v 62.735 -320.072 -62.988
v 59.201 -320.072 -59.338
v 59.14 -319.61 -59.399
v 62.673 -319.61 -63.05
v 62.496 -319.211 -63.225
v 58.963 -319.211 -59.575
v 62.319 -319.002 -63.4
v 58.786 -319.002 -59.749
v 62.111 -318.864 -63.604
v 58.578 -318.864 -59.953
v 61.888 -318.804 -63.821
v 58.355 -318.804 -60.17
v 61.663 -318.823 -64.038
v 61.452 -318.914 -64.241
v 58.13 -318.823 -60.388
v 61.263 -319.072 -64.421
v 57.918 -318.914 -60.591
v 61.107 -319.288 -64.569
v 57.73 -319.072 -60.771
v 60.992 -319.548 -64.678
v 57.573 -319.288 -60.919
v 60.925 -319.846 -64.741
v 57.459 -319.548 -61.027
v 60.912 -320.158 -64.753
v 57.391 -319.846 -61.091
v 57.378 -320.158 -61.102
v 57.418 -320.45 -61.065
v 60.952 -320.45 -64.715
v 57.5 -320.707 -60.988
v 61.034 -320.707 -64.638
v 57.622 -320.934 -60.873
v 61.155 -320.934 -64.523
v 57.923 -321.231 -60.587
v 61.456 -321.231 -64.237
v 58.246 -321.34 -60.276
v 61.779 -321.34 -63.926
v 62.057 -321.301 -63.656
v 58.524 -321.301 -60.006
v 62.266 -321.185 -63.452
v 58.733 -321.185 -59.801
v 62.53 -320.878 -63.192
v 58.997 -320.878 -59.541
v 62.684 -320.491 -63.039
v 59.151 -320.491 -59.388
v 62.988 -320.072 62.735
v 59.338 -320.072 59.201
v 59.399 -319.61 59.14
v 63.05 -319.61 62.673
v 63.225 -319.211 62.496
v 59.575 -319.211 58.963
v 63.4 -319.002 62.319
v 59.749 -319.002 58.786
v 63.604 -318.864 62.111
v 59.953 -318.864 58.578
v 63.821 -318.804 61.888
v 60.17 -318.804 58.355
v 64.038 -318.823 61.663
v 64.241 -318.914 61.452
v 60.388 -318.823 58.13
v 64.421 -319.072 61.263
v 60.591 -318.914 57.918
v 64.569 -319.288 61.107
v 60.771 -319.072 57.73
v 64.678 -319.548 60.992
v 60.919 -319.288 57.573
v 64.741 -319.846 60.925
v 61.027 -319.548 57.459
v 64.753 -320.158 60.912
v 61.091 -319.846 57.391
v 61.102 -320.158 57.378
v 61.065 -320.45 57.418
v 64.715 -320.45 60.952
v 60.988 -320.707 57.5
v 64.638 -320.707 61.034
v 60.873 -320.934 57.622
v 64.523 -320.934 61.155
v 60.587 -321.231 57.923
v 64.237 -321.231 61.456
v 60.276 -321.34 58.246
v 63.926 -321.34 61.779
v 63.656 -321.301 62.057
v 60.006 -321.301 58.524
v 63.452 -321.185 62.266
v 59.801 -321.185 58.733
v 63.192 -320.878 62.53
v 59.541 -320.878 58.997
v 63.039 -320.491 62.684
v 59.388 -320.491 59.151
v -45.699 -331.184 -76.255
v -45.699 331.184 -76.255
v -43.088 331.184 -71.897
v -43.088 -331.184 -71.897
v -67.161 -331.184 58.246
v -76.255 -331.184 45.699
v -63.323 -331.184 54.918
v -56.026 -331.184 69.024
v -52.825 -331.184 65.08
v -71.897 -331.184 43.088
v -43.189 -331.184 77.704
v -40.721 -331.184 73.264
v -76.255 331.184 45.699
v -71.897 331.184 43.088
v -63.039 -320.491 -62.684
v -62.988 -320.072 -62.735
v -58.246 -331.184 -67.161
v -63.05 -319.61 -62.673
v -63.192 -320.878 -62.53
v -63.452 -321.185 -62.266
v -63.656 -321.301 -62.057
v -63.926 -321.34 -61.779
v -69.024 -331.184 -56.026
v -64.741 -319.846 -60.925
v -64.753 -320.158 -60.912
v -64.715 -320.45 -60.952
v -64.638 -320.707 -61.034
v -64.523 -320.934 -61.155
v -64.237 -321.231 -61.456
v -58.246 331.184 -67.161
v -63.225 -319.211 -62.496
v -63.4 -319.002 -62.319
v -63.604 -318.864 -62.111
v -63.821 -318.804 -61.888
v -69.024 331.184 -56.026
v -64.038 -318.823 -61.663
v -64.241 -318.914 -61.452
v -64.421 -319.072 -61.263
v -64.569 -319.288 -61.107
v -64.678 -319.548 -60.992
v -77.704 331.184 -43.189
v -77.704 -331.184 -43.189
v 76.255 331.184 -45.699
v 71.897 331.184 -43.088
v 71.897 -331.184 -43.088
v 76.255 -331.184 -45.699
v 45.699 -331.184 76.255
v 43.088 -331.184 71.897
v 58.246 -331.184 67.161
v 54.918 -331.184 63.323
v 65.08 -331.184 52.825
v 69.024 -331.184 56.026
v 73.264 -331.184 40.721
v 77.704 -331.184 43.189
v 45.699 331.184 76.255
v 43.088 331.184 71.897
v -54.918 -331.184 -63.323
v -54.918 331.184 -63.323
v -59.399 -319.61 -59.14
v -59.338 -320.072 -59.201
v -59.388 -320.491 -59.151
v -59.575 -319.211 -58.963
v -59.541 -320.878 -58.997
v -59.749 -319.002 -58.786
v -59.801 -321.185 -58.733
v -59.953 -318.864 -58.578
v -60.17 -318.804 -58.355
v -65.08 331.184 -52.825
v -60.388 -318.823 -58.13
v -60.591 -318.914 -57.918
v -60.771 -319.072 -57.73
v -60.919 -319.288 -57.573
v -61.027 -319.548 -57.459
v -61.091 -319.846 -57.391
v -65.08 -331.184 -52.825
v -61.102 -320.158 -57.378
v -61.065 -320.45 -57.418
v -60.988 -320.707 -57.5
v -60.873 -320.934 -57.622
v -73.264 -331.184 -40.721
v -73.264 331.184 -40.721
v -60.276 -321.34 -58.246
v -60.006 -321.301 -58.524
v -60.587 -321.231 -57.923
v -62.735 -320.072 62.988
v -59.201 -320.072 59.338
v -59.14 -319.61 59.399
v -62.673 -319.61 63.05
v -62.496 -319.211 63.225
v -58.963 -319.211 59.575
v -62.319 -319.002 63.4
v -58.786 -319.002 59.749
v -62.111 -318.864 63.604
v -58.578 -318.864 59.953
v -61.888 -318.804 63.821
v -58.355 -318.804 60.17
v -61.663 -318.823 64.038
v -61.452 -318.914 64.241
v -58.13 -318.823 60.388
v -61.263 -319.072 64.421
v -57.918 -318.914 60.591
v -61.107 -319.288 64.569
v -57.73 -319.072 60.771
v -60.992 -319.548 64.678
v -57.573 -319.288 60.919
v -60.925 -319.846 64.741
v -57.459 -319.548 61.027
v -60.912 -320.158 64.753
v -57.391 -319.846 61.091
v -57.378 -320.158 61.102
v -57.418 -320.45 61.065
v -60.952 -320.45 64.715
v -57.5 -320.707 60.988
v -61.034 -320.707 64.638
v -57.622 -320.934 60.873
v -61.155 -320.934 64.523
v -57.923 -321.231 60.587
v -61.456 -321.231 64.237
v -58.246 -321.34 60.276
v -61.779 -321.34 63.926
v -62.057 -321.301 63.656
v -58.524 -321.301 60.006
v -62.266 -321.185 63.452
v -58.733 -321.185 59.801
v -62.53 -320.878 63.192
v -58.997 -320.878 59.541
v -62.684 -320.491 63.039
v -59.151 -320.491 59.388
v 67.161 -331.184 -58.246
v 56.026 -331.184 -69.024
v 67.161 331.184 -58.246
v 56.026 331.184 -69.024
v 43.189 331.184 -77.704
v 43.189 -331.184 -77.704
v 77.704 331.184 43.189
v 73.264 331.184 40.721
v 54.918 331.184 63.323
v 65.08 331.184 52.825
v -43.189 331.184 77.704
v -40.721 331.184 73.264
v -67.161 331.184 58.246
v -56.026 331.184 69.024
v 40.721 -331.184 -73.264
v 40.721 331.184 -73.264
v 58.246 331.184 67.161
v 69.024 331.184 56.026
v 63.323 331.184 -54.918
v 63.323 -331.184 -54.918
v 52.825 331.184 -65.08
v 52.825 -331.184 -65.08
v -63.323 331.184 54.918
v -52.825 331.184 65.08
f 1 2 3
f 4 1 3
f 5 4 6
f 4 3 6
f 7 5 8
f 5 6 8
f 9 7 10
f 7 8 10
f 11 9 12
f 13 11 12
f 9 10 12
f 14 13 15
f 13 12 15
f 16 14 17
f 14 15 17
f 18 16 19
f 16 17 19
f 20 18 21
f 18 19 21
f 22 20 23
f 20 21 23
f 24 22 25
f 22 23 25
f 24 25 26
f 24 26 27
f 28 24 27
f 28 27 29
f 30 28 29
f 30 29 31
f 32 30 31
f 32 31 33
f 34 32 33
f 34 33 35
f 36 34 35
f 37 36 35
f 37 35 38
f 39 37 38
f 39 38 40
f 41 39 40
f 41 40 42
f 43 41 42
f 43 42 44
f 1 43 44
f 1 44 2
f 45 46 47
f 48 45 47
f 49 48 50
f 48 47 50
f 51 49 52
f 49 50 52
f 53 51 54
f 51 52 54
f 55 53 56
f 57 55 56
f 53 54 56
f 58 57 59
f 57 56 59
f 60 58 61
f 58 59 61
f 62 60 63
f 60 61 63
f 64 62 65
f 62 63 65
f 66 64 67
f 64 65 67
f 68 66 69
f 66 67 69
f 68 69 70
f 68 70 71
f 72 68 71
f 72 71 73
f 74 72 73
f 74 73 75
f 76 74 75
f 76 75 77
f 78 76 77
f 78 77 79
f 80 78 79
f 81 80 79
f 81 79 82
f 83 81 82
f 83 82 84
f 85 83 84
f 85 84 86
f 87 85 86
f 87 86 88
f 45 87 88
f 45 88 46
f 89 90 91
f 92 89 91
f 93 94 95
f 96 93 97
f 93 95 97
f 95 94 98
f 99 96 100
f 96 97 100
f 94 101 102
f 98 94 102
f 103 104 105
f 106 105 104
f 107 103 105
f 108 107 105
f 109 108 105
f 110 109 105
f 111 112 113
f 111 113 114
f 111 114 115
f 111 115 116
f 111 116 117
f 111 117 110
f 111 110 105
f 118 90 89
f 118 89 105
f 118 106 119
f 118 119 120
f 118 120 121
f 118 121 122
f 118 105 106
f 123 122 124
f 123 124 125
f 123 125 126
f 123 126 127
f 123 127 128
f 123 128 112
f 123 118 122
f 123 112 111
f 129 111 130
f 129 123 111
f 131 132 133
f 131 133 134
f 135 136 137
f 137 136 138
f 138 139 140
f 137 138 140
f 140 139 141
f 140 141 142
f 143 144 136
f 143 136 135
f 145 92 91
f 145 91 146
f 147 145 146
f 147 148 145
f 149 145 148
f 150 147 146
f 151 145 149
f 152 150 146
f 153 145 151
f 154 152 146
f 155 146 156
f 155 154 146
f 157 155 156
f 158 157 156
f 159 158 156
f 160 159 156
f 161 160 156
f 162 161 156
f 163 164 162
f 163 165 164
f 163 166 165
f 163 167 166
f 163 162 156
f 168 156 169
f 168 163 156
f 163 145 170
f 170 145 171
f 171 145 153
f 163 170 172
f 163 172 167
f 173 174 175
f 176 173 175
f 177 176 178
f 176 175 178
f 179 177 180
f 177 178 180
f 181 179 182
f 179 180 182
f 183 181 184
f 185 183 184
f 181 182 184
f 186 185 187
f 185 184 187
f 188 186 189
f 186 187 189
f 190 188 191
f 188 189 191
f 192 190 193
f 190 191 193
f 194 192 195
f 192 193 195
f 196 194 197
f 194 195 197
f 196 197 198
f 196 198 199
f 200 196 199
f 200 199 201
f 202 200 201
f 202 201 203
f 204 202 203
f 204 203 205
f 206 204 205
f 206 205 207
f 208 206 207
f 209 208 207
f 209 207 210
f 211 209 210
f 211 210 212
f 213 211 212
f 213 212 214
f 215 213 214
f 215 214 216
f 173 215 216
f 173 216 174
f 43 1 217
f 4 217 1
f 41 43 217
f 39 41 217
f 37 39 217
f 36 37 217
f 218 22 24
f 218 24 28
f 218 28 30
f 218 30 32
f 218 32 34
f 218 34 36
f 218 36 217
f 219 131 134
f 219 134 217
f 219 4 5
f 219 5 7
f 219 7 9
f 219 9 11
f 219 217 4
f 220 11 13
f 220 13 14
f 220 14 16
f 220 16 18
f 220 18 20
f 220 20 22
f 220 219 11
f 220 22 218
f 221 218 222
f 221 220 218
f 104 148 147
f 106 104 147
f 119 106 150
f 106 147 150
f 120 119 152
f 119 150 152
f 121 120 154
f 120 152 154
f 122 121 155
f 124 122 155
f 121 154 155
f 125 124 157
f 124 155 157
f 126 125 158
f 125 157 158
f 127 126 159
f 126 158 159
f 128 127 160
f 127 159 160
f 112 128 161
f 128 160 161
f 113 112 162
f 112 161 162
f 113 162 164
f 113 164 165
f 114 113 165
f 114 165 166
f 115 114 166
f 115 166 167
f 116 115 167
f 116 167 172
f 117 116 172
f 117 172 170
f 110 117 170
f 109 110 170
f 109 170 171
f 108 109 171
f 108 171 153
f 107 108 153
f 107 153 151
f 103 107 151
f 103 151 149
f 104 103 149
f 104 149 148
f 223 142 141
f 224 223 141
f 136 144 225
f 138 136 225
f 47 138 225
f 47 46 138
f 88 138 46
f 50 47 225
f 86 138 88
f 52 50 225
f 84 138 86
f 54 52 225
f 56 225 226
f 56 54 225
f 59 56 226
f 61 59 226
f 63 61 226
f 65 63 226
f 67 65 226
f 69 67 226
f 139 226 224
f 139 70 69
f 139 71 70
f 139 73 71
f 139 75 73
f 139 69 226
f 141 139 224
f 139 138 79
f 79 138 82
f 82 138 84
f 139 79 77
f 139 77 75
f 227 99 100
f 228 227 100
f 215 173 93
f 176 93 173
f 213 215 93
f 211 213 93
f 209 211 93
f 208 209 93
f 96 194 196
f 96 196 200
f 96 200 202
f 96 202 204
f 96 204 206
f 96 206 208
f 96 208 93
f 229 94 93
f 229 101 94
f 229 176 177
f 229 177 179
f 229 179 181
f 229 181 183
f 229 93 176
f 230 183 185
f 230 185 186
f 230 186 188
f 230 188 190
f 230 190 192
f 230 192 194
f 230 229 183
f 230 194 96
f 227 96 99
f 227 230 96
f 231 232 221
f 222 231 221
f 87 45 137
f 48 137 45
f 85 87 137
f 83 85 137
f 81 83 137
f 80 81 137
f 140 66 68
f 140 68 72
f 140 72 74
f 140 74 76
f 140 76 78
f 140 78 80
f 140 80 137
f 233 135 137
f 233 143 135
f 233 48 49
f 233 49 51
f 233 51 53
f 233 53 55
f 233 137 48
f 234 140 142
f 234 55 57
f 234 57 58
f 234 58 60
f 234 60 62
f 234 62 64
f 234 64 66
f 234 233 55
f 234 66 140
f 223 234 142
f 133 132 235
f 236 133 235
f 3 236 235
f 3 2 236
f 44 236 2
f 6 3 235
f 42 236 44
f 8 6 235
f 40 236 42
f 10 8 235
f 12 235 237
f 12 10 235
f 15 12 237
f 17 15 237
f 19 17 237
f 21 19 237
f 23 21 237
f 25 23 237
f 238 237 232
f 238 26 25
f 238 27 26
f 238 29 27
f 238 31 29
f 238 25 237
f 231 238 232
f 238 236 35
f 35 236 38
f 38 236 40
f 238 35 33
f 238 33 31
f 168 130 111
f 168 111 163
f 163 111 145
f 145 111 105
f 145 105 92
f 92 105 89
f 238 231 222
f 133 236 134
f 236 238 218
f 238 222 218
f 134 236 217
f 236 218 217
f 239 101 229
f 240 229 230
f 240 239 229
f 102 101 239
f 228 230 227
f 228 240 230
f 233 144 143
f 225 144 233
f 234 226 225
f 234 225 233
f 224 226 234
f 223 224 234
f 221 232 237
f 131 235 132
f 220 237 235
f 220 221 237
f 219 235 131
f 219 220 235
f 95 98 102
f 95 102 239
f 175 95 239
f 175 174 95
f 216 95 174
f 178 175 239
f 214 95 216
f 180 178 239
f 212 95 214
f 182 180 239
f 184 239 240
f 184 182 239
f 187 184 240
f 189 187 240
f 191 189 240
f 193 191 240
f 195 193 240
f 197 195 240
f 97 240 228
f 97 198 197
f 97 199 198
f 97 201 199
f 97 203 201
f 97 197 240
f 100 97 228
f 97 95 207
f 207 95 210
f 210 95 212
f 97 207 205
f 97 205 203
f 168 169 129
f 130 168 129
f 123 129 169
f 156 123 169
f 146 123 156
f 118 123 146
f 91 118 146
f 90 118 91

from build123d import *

# Parameters (mm, degrees)
SKETCH2_R               = 88.9
SKETCH2_R_2             = 83.82
BOSS_EXTRUDE1_DEPTH     = 331.184123
CUT_EXTRUDE1_DEPTH      = 332.184123
CUT_EXTRUDE1_DEPTH_BACK = 332.184123
SKETCH5_R               = 1.27
BOLT_HOLES_DEPTH        = 29.911624556
BOLT_PATTERN_COUNT      = 4


with BuildPart() as part:
    # Sketch2 → Boss-Extrude1 (new body, symmetric)
    with BuildSketch(Plane(origin=(0, 0, 0), x_dir=(1, 0, 0), z_dir=(0, 1, 0))):
        Circle(SKETCH2_R)
        Circle(SKETCH2_R_2, mode=Mode.SUBTRACT)
    extrude(amount=BOSS_EXTRUDE1_DEPTH, both=True)

    # Sketch3 → Cut-Extrude1 (cut, two sides)
    with BuildSketch(Plane(origin=(0, 0, 0), x_dir=(1, 0, 0), z_dir=(0, 1, 0))) as cut_extrude1_sk:
        Polygon((169.661755759, -94.300371224), (0, 0), (169.661755759, 101.677593364), align=None)
        Polygon((0, 0), (53.900027233, 96.974944394), (-58.116685864, 96.974944394), align=None)
        Polygon((-123.741299607, 68.777140945), (-123.741299607, -74.157652604), (0, 0), align=None)
        Polygon((-65.840936026, -118.45858783), (0, 0), (70.991745134, -118.45858783), align=None)
    extrude(amount=CUT_EXTRUDE1_DEPTH, mode=Mode.SUBTRACT)
    extrude(cut_extrude1_sk.sketch, amount=-CUT_EXTRUDE1_DEPTH_BACK, mode=Mode.SUBTRACT)

    # Sketch5 → Bolt holes (cut, through all)
    with BuildSketch(Plane(origin=(-56.309218645, 0, 58.175814955), x_dir=(-0.718540152, 0, -0.695485478), z_dir=(0.695485478, 0, -0.718540152))):
        with Locations((0, -320.071623)):
            Circle(SKETCH5_R)
    bolt_holes = extrude(amount=-BOLT_HOLES_DEPTH, mode=Mode.SUBTRACT)

    # Bolt pattern: Bolt holes ×4 about axis
    bolt_pattern_axis = Axis((0, 331.184123, 0), (0, 1, 0))
    for i in range(1, BOLT_PATTERN_COUNT):
        add(bolt_holes.rotate(bolt_pattern_axis, i * 360 / BOLT_PATTERN_COUNT), mode=Mode.SUBTRACT)


solid = part.part
